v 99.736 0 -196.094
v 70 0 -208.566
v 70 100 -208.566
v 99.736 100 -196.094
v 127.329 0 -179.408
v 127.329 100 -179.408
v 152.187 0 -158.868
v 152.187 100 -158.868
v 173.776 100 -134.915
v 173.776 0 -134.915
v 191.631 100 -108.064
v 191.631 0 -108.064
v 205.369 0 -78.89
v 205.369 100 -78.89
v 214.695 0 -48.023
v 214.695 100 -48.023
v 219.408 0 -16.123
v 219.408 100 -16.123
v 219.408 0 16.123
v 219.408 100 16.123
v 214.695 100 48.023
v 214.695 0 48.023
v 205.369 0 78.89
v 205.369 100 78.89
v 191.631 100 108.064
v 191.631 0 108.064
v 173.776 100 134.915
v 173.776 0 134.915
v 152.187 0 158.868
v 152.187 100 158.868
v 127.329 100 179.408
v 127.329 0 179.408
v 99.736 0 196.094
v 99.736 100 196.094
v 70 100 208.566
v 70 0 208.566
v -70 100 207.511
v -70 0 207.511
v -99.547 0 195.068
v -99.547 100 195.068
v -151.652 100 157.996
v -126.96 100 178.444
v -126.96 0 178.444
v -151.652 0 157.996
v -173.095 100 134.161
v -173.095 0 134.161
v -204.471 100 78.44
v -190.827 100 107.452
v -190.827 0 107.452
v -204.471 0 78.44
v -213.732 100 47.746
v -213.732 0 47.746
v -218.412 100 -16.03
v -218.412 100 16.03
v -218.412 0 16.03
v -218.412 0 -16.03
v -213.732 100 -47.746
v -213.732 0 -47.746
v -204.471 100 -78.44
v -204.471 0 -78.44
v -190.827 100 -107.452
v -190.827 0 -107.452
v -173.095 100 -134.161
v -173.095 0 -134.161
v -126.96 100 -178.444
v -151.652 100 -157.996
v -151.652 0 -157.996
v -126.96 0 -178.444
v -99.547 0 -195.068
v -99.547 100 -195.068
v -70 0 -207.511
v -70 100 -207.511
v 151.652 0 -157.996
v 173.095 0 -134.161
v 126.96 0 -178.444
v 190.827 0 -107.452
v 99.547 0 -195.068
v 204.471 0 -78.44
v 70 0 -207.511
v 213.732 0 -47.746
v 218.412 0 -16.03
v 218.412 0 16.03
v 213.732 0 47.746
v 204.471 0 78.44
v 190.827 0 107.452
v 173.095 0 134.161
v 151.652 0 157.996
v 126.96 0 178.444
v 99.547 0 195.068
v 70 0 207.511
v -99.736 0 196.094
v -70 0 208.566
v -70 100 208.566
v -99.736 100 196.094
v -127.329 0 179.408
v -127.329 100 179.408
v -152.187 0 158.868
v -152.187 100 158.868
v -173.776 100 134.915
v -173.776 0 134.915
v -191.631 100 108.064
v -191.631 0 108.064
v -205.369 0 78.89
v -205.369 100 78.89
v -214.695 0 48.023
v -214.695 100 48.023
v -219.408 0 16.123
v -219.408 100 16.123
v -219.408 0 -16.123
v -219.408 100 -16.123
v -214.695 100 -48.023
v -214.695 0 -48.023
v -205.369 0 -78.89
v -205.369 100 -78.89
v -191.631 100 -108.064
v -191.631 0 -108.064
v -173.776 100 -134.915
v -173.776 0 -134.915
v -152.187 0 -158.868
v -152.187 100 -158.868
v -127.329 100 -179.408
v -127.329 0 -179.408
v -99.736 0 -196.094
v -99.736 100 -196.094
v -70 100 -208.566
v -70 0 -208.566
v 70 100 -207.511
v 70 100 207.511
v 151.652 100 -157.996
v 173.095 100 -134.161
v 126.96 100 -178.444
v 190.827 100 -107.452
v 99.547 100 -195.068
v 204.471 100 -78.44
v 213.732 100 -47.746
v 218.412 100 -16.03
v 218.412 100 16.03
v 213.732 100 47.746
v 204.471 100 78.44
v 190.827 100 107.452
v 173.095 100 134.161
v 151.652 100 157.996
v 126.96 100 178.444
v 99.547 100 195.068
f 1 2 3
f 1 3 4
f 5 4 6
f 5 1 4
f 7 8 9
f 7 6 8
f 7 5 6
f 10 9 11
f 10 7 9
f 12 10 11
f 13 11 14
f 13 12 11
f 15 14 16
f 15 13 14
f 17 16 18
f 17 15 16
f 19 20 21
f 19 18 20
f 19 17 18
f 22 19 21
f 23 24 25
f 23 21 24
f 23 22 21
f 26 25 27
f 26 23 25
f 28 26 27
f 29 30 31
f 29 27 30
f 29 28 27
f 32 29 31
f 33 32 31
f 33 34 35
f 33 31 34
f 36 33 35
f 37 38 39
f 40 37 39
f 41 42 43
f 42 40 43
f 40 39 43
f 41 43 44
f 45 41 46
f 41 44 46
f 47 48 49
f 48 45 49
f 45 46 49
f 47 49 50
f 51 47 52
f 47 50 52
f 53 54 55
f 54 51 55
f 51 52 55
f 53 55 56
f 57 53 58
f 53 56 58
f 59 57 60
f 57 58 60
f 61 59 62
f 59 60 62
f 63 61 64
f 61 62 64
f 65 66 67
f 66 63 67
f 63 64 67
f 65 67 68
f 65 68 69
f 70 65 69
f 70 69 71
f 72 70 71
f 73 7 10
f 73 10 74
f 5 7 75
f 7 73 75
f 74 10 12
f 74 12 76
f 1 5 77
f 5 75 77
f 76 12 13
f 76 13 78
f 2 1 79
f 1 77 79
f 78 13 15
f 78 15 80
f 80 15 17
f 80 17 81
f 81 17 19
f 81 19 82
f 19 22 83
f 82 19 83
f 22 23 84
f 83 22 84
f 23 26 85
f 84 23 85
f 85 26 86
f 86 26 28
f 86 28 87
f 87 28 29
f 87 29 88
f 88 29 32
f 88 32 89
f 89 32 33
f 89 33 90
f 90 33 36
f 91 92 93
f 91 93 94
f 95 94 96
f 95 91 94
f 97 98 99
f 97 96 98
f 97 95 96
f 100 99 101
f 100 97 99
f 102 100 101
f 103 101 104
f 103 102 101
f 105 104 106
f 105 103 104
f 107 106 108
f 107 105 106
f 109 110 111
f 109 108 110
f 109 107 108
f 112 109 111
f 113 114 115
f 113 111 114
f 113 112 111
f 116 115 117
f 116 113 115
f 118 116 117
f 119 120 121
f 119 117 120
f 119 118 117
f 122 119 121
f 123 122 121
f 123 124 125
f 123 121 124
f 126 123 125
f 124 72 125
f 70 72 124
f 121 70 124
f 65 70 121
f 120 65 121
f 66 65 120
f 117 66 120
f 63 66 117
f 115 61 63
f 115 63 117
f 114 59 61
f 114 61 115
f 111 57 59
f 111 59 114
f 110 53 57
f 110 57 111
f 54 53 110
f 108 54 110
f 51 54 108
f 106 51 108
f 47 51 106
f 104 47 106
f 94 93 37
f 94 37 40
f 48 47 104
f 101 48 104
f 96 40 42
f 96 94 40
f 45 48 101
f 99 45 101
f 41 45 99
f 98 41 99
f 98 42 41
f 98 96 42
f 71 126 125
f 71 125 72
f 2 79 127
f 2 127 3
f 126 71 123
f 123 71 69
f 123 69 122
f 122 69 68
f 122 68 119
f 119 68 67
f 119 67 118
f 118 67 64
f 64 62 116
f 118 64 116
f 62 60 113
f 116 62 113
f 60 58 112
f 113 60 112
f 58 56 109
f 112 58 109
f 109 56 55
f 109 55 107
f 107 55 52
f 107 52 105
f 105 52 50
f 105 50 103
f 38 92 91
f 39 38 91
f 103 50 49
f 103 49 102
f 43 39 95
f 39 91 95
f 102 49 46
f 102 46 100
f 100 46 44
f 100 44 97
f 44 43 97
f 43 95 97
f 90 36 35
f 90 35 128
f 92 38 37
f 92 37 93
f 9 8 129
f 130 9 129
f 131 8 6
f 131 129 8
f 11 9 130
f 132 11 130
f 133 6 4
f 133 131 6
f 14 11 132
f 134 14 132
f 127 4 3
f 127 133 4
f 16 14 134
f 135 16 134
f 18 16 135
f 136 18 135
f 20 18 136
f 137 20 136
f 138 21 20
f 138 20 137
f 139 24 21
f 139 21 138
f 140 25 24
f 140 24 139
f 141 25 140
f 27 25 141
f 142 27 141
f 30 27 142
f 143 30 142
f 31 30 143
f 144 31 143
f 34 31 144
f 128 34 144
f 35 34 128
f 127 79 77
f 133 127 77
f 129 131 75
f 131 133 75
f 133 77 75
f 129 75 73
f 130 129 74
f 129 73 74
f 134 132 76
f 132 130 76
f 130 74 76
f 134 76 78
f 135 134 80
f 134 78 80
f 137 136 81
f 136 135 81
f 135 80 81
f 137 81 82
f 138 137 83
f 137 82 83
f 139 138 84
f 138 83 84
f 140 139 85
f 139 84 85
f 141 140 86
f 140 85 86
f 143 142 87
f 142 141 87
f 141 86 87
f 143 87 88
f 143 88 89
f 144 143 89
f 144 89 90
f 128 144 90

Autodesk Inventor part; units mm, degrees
ref_plane "YZ Plane" through (0, 0, 0) normal (1, 0, 0) x (0, 1, 0)
ref_plane "XZ Plane" through (0, 0, 0) normal (0, 1, 0) x (-1, 0, 0)
ref_plane "XY Plane" through (0, 0, 0) normal (0, 0, 1) x (1, 0, 0)
sketch "Sketch1" plane through (0, 0, 0) normal (0, 1, 0) x (-1, 0, 0)
  line L0 (-70, -252.7863) -> (70, -252.7863)
  arc A0 (-70, 207.5114) -> (-70, -207.5114) centre (0, 0) ccw
  arc A1 (70, -207.5114) -> (70, 207.5114) centre (0, 0) ccw
  arc A2 (-70, 208.5665) -> (-70, -208.5665) centre (0, 0) ccw
  arc A3 (70, -208.5665) -> (70, 208.5665) centre (0, 0) ccw
  line L1 (70, -208.5665) -> (70, -207.5114)
  line L2 (70, 207.5114) -> (70, 208.5665)
  line L3 (-70, 208.5665) -> (-70, 207.5114)
  line L4 (-70, -207.5114) -> (-70, -208.5665)
  dimension "d2" = 140
extrude "Extrusion1" add sketch "Sketch1" along normal blind 100
properties part number "Enclosure"
